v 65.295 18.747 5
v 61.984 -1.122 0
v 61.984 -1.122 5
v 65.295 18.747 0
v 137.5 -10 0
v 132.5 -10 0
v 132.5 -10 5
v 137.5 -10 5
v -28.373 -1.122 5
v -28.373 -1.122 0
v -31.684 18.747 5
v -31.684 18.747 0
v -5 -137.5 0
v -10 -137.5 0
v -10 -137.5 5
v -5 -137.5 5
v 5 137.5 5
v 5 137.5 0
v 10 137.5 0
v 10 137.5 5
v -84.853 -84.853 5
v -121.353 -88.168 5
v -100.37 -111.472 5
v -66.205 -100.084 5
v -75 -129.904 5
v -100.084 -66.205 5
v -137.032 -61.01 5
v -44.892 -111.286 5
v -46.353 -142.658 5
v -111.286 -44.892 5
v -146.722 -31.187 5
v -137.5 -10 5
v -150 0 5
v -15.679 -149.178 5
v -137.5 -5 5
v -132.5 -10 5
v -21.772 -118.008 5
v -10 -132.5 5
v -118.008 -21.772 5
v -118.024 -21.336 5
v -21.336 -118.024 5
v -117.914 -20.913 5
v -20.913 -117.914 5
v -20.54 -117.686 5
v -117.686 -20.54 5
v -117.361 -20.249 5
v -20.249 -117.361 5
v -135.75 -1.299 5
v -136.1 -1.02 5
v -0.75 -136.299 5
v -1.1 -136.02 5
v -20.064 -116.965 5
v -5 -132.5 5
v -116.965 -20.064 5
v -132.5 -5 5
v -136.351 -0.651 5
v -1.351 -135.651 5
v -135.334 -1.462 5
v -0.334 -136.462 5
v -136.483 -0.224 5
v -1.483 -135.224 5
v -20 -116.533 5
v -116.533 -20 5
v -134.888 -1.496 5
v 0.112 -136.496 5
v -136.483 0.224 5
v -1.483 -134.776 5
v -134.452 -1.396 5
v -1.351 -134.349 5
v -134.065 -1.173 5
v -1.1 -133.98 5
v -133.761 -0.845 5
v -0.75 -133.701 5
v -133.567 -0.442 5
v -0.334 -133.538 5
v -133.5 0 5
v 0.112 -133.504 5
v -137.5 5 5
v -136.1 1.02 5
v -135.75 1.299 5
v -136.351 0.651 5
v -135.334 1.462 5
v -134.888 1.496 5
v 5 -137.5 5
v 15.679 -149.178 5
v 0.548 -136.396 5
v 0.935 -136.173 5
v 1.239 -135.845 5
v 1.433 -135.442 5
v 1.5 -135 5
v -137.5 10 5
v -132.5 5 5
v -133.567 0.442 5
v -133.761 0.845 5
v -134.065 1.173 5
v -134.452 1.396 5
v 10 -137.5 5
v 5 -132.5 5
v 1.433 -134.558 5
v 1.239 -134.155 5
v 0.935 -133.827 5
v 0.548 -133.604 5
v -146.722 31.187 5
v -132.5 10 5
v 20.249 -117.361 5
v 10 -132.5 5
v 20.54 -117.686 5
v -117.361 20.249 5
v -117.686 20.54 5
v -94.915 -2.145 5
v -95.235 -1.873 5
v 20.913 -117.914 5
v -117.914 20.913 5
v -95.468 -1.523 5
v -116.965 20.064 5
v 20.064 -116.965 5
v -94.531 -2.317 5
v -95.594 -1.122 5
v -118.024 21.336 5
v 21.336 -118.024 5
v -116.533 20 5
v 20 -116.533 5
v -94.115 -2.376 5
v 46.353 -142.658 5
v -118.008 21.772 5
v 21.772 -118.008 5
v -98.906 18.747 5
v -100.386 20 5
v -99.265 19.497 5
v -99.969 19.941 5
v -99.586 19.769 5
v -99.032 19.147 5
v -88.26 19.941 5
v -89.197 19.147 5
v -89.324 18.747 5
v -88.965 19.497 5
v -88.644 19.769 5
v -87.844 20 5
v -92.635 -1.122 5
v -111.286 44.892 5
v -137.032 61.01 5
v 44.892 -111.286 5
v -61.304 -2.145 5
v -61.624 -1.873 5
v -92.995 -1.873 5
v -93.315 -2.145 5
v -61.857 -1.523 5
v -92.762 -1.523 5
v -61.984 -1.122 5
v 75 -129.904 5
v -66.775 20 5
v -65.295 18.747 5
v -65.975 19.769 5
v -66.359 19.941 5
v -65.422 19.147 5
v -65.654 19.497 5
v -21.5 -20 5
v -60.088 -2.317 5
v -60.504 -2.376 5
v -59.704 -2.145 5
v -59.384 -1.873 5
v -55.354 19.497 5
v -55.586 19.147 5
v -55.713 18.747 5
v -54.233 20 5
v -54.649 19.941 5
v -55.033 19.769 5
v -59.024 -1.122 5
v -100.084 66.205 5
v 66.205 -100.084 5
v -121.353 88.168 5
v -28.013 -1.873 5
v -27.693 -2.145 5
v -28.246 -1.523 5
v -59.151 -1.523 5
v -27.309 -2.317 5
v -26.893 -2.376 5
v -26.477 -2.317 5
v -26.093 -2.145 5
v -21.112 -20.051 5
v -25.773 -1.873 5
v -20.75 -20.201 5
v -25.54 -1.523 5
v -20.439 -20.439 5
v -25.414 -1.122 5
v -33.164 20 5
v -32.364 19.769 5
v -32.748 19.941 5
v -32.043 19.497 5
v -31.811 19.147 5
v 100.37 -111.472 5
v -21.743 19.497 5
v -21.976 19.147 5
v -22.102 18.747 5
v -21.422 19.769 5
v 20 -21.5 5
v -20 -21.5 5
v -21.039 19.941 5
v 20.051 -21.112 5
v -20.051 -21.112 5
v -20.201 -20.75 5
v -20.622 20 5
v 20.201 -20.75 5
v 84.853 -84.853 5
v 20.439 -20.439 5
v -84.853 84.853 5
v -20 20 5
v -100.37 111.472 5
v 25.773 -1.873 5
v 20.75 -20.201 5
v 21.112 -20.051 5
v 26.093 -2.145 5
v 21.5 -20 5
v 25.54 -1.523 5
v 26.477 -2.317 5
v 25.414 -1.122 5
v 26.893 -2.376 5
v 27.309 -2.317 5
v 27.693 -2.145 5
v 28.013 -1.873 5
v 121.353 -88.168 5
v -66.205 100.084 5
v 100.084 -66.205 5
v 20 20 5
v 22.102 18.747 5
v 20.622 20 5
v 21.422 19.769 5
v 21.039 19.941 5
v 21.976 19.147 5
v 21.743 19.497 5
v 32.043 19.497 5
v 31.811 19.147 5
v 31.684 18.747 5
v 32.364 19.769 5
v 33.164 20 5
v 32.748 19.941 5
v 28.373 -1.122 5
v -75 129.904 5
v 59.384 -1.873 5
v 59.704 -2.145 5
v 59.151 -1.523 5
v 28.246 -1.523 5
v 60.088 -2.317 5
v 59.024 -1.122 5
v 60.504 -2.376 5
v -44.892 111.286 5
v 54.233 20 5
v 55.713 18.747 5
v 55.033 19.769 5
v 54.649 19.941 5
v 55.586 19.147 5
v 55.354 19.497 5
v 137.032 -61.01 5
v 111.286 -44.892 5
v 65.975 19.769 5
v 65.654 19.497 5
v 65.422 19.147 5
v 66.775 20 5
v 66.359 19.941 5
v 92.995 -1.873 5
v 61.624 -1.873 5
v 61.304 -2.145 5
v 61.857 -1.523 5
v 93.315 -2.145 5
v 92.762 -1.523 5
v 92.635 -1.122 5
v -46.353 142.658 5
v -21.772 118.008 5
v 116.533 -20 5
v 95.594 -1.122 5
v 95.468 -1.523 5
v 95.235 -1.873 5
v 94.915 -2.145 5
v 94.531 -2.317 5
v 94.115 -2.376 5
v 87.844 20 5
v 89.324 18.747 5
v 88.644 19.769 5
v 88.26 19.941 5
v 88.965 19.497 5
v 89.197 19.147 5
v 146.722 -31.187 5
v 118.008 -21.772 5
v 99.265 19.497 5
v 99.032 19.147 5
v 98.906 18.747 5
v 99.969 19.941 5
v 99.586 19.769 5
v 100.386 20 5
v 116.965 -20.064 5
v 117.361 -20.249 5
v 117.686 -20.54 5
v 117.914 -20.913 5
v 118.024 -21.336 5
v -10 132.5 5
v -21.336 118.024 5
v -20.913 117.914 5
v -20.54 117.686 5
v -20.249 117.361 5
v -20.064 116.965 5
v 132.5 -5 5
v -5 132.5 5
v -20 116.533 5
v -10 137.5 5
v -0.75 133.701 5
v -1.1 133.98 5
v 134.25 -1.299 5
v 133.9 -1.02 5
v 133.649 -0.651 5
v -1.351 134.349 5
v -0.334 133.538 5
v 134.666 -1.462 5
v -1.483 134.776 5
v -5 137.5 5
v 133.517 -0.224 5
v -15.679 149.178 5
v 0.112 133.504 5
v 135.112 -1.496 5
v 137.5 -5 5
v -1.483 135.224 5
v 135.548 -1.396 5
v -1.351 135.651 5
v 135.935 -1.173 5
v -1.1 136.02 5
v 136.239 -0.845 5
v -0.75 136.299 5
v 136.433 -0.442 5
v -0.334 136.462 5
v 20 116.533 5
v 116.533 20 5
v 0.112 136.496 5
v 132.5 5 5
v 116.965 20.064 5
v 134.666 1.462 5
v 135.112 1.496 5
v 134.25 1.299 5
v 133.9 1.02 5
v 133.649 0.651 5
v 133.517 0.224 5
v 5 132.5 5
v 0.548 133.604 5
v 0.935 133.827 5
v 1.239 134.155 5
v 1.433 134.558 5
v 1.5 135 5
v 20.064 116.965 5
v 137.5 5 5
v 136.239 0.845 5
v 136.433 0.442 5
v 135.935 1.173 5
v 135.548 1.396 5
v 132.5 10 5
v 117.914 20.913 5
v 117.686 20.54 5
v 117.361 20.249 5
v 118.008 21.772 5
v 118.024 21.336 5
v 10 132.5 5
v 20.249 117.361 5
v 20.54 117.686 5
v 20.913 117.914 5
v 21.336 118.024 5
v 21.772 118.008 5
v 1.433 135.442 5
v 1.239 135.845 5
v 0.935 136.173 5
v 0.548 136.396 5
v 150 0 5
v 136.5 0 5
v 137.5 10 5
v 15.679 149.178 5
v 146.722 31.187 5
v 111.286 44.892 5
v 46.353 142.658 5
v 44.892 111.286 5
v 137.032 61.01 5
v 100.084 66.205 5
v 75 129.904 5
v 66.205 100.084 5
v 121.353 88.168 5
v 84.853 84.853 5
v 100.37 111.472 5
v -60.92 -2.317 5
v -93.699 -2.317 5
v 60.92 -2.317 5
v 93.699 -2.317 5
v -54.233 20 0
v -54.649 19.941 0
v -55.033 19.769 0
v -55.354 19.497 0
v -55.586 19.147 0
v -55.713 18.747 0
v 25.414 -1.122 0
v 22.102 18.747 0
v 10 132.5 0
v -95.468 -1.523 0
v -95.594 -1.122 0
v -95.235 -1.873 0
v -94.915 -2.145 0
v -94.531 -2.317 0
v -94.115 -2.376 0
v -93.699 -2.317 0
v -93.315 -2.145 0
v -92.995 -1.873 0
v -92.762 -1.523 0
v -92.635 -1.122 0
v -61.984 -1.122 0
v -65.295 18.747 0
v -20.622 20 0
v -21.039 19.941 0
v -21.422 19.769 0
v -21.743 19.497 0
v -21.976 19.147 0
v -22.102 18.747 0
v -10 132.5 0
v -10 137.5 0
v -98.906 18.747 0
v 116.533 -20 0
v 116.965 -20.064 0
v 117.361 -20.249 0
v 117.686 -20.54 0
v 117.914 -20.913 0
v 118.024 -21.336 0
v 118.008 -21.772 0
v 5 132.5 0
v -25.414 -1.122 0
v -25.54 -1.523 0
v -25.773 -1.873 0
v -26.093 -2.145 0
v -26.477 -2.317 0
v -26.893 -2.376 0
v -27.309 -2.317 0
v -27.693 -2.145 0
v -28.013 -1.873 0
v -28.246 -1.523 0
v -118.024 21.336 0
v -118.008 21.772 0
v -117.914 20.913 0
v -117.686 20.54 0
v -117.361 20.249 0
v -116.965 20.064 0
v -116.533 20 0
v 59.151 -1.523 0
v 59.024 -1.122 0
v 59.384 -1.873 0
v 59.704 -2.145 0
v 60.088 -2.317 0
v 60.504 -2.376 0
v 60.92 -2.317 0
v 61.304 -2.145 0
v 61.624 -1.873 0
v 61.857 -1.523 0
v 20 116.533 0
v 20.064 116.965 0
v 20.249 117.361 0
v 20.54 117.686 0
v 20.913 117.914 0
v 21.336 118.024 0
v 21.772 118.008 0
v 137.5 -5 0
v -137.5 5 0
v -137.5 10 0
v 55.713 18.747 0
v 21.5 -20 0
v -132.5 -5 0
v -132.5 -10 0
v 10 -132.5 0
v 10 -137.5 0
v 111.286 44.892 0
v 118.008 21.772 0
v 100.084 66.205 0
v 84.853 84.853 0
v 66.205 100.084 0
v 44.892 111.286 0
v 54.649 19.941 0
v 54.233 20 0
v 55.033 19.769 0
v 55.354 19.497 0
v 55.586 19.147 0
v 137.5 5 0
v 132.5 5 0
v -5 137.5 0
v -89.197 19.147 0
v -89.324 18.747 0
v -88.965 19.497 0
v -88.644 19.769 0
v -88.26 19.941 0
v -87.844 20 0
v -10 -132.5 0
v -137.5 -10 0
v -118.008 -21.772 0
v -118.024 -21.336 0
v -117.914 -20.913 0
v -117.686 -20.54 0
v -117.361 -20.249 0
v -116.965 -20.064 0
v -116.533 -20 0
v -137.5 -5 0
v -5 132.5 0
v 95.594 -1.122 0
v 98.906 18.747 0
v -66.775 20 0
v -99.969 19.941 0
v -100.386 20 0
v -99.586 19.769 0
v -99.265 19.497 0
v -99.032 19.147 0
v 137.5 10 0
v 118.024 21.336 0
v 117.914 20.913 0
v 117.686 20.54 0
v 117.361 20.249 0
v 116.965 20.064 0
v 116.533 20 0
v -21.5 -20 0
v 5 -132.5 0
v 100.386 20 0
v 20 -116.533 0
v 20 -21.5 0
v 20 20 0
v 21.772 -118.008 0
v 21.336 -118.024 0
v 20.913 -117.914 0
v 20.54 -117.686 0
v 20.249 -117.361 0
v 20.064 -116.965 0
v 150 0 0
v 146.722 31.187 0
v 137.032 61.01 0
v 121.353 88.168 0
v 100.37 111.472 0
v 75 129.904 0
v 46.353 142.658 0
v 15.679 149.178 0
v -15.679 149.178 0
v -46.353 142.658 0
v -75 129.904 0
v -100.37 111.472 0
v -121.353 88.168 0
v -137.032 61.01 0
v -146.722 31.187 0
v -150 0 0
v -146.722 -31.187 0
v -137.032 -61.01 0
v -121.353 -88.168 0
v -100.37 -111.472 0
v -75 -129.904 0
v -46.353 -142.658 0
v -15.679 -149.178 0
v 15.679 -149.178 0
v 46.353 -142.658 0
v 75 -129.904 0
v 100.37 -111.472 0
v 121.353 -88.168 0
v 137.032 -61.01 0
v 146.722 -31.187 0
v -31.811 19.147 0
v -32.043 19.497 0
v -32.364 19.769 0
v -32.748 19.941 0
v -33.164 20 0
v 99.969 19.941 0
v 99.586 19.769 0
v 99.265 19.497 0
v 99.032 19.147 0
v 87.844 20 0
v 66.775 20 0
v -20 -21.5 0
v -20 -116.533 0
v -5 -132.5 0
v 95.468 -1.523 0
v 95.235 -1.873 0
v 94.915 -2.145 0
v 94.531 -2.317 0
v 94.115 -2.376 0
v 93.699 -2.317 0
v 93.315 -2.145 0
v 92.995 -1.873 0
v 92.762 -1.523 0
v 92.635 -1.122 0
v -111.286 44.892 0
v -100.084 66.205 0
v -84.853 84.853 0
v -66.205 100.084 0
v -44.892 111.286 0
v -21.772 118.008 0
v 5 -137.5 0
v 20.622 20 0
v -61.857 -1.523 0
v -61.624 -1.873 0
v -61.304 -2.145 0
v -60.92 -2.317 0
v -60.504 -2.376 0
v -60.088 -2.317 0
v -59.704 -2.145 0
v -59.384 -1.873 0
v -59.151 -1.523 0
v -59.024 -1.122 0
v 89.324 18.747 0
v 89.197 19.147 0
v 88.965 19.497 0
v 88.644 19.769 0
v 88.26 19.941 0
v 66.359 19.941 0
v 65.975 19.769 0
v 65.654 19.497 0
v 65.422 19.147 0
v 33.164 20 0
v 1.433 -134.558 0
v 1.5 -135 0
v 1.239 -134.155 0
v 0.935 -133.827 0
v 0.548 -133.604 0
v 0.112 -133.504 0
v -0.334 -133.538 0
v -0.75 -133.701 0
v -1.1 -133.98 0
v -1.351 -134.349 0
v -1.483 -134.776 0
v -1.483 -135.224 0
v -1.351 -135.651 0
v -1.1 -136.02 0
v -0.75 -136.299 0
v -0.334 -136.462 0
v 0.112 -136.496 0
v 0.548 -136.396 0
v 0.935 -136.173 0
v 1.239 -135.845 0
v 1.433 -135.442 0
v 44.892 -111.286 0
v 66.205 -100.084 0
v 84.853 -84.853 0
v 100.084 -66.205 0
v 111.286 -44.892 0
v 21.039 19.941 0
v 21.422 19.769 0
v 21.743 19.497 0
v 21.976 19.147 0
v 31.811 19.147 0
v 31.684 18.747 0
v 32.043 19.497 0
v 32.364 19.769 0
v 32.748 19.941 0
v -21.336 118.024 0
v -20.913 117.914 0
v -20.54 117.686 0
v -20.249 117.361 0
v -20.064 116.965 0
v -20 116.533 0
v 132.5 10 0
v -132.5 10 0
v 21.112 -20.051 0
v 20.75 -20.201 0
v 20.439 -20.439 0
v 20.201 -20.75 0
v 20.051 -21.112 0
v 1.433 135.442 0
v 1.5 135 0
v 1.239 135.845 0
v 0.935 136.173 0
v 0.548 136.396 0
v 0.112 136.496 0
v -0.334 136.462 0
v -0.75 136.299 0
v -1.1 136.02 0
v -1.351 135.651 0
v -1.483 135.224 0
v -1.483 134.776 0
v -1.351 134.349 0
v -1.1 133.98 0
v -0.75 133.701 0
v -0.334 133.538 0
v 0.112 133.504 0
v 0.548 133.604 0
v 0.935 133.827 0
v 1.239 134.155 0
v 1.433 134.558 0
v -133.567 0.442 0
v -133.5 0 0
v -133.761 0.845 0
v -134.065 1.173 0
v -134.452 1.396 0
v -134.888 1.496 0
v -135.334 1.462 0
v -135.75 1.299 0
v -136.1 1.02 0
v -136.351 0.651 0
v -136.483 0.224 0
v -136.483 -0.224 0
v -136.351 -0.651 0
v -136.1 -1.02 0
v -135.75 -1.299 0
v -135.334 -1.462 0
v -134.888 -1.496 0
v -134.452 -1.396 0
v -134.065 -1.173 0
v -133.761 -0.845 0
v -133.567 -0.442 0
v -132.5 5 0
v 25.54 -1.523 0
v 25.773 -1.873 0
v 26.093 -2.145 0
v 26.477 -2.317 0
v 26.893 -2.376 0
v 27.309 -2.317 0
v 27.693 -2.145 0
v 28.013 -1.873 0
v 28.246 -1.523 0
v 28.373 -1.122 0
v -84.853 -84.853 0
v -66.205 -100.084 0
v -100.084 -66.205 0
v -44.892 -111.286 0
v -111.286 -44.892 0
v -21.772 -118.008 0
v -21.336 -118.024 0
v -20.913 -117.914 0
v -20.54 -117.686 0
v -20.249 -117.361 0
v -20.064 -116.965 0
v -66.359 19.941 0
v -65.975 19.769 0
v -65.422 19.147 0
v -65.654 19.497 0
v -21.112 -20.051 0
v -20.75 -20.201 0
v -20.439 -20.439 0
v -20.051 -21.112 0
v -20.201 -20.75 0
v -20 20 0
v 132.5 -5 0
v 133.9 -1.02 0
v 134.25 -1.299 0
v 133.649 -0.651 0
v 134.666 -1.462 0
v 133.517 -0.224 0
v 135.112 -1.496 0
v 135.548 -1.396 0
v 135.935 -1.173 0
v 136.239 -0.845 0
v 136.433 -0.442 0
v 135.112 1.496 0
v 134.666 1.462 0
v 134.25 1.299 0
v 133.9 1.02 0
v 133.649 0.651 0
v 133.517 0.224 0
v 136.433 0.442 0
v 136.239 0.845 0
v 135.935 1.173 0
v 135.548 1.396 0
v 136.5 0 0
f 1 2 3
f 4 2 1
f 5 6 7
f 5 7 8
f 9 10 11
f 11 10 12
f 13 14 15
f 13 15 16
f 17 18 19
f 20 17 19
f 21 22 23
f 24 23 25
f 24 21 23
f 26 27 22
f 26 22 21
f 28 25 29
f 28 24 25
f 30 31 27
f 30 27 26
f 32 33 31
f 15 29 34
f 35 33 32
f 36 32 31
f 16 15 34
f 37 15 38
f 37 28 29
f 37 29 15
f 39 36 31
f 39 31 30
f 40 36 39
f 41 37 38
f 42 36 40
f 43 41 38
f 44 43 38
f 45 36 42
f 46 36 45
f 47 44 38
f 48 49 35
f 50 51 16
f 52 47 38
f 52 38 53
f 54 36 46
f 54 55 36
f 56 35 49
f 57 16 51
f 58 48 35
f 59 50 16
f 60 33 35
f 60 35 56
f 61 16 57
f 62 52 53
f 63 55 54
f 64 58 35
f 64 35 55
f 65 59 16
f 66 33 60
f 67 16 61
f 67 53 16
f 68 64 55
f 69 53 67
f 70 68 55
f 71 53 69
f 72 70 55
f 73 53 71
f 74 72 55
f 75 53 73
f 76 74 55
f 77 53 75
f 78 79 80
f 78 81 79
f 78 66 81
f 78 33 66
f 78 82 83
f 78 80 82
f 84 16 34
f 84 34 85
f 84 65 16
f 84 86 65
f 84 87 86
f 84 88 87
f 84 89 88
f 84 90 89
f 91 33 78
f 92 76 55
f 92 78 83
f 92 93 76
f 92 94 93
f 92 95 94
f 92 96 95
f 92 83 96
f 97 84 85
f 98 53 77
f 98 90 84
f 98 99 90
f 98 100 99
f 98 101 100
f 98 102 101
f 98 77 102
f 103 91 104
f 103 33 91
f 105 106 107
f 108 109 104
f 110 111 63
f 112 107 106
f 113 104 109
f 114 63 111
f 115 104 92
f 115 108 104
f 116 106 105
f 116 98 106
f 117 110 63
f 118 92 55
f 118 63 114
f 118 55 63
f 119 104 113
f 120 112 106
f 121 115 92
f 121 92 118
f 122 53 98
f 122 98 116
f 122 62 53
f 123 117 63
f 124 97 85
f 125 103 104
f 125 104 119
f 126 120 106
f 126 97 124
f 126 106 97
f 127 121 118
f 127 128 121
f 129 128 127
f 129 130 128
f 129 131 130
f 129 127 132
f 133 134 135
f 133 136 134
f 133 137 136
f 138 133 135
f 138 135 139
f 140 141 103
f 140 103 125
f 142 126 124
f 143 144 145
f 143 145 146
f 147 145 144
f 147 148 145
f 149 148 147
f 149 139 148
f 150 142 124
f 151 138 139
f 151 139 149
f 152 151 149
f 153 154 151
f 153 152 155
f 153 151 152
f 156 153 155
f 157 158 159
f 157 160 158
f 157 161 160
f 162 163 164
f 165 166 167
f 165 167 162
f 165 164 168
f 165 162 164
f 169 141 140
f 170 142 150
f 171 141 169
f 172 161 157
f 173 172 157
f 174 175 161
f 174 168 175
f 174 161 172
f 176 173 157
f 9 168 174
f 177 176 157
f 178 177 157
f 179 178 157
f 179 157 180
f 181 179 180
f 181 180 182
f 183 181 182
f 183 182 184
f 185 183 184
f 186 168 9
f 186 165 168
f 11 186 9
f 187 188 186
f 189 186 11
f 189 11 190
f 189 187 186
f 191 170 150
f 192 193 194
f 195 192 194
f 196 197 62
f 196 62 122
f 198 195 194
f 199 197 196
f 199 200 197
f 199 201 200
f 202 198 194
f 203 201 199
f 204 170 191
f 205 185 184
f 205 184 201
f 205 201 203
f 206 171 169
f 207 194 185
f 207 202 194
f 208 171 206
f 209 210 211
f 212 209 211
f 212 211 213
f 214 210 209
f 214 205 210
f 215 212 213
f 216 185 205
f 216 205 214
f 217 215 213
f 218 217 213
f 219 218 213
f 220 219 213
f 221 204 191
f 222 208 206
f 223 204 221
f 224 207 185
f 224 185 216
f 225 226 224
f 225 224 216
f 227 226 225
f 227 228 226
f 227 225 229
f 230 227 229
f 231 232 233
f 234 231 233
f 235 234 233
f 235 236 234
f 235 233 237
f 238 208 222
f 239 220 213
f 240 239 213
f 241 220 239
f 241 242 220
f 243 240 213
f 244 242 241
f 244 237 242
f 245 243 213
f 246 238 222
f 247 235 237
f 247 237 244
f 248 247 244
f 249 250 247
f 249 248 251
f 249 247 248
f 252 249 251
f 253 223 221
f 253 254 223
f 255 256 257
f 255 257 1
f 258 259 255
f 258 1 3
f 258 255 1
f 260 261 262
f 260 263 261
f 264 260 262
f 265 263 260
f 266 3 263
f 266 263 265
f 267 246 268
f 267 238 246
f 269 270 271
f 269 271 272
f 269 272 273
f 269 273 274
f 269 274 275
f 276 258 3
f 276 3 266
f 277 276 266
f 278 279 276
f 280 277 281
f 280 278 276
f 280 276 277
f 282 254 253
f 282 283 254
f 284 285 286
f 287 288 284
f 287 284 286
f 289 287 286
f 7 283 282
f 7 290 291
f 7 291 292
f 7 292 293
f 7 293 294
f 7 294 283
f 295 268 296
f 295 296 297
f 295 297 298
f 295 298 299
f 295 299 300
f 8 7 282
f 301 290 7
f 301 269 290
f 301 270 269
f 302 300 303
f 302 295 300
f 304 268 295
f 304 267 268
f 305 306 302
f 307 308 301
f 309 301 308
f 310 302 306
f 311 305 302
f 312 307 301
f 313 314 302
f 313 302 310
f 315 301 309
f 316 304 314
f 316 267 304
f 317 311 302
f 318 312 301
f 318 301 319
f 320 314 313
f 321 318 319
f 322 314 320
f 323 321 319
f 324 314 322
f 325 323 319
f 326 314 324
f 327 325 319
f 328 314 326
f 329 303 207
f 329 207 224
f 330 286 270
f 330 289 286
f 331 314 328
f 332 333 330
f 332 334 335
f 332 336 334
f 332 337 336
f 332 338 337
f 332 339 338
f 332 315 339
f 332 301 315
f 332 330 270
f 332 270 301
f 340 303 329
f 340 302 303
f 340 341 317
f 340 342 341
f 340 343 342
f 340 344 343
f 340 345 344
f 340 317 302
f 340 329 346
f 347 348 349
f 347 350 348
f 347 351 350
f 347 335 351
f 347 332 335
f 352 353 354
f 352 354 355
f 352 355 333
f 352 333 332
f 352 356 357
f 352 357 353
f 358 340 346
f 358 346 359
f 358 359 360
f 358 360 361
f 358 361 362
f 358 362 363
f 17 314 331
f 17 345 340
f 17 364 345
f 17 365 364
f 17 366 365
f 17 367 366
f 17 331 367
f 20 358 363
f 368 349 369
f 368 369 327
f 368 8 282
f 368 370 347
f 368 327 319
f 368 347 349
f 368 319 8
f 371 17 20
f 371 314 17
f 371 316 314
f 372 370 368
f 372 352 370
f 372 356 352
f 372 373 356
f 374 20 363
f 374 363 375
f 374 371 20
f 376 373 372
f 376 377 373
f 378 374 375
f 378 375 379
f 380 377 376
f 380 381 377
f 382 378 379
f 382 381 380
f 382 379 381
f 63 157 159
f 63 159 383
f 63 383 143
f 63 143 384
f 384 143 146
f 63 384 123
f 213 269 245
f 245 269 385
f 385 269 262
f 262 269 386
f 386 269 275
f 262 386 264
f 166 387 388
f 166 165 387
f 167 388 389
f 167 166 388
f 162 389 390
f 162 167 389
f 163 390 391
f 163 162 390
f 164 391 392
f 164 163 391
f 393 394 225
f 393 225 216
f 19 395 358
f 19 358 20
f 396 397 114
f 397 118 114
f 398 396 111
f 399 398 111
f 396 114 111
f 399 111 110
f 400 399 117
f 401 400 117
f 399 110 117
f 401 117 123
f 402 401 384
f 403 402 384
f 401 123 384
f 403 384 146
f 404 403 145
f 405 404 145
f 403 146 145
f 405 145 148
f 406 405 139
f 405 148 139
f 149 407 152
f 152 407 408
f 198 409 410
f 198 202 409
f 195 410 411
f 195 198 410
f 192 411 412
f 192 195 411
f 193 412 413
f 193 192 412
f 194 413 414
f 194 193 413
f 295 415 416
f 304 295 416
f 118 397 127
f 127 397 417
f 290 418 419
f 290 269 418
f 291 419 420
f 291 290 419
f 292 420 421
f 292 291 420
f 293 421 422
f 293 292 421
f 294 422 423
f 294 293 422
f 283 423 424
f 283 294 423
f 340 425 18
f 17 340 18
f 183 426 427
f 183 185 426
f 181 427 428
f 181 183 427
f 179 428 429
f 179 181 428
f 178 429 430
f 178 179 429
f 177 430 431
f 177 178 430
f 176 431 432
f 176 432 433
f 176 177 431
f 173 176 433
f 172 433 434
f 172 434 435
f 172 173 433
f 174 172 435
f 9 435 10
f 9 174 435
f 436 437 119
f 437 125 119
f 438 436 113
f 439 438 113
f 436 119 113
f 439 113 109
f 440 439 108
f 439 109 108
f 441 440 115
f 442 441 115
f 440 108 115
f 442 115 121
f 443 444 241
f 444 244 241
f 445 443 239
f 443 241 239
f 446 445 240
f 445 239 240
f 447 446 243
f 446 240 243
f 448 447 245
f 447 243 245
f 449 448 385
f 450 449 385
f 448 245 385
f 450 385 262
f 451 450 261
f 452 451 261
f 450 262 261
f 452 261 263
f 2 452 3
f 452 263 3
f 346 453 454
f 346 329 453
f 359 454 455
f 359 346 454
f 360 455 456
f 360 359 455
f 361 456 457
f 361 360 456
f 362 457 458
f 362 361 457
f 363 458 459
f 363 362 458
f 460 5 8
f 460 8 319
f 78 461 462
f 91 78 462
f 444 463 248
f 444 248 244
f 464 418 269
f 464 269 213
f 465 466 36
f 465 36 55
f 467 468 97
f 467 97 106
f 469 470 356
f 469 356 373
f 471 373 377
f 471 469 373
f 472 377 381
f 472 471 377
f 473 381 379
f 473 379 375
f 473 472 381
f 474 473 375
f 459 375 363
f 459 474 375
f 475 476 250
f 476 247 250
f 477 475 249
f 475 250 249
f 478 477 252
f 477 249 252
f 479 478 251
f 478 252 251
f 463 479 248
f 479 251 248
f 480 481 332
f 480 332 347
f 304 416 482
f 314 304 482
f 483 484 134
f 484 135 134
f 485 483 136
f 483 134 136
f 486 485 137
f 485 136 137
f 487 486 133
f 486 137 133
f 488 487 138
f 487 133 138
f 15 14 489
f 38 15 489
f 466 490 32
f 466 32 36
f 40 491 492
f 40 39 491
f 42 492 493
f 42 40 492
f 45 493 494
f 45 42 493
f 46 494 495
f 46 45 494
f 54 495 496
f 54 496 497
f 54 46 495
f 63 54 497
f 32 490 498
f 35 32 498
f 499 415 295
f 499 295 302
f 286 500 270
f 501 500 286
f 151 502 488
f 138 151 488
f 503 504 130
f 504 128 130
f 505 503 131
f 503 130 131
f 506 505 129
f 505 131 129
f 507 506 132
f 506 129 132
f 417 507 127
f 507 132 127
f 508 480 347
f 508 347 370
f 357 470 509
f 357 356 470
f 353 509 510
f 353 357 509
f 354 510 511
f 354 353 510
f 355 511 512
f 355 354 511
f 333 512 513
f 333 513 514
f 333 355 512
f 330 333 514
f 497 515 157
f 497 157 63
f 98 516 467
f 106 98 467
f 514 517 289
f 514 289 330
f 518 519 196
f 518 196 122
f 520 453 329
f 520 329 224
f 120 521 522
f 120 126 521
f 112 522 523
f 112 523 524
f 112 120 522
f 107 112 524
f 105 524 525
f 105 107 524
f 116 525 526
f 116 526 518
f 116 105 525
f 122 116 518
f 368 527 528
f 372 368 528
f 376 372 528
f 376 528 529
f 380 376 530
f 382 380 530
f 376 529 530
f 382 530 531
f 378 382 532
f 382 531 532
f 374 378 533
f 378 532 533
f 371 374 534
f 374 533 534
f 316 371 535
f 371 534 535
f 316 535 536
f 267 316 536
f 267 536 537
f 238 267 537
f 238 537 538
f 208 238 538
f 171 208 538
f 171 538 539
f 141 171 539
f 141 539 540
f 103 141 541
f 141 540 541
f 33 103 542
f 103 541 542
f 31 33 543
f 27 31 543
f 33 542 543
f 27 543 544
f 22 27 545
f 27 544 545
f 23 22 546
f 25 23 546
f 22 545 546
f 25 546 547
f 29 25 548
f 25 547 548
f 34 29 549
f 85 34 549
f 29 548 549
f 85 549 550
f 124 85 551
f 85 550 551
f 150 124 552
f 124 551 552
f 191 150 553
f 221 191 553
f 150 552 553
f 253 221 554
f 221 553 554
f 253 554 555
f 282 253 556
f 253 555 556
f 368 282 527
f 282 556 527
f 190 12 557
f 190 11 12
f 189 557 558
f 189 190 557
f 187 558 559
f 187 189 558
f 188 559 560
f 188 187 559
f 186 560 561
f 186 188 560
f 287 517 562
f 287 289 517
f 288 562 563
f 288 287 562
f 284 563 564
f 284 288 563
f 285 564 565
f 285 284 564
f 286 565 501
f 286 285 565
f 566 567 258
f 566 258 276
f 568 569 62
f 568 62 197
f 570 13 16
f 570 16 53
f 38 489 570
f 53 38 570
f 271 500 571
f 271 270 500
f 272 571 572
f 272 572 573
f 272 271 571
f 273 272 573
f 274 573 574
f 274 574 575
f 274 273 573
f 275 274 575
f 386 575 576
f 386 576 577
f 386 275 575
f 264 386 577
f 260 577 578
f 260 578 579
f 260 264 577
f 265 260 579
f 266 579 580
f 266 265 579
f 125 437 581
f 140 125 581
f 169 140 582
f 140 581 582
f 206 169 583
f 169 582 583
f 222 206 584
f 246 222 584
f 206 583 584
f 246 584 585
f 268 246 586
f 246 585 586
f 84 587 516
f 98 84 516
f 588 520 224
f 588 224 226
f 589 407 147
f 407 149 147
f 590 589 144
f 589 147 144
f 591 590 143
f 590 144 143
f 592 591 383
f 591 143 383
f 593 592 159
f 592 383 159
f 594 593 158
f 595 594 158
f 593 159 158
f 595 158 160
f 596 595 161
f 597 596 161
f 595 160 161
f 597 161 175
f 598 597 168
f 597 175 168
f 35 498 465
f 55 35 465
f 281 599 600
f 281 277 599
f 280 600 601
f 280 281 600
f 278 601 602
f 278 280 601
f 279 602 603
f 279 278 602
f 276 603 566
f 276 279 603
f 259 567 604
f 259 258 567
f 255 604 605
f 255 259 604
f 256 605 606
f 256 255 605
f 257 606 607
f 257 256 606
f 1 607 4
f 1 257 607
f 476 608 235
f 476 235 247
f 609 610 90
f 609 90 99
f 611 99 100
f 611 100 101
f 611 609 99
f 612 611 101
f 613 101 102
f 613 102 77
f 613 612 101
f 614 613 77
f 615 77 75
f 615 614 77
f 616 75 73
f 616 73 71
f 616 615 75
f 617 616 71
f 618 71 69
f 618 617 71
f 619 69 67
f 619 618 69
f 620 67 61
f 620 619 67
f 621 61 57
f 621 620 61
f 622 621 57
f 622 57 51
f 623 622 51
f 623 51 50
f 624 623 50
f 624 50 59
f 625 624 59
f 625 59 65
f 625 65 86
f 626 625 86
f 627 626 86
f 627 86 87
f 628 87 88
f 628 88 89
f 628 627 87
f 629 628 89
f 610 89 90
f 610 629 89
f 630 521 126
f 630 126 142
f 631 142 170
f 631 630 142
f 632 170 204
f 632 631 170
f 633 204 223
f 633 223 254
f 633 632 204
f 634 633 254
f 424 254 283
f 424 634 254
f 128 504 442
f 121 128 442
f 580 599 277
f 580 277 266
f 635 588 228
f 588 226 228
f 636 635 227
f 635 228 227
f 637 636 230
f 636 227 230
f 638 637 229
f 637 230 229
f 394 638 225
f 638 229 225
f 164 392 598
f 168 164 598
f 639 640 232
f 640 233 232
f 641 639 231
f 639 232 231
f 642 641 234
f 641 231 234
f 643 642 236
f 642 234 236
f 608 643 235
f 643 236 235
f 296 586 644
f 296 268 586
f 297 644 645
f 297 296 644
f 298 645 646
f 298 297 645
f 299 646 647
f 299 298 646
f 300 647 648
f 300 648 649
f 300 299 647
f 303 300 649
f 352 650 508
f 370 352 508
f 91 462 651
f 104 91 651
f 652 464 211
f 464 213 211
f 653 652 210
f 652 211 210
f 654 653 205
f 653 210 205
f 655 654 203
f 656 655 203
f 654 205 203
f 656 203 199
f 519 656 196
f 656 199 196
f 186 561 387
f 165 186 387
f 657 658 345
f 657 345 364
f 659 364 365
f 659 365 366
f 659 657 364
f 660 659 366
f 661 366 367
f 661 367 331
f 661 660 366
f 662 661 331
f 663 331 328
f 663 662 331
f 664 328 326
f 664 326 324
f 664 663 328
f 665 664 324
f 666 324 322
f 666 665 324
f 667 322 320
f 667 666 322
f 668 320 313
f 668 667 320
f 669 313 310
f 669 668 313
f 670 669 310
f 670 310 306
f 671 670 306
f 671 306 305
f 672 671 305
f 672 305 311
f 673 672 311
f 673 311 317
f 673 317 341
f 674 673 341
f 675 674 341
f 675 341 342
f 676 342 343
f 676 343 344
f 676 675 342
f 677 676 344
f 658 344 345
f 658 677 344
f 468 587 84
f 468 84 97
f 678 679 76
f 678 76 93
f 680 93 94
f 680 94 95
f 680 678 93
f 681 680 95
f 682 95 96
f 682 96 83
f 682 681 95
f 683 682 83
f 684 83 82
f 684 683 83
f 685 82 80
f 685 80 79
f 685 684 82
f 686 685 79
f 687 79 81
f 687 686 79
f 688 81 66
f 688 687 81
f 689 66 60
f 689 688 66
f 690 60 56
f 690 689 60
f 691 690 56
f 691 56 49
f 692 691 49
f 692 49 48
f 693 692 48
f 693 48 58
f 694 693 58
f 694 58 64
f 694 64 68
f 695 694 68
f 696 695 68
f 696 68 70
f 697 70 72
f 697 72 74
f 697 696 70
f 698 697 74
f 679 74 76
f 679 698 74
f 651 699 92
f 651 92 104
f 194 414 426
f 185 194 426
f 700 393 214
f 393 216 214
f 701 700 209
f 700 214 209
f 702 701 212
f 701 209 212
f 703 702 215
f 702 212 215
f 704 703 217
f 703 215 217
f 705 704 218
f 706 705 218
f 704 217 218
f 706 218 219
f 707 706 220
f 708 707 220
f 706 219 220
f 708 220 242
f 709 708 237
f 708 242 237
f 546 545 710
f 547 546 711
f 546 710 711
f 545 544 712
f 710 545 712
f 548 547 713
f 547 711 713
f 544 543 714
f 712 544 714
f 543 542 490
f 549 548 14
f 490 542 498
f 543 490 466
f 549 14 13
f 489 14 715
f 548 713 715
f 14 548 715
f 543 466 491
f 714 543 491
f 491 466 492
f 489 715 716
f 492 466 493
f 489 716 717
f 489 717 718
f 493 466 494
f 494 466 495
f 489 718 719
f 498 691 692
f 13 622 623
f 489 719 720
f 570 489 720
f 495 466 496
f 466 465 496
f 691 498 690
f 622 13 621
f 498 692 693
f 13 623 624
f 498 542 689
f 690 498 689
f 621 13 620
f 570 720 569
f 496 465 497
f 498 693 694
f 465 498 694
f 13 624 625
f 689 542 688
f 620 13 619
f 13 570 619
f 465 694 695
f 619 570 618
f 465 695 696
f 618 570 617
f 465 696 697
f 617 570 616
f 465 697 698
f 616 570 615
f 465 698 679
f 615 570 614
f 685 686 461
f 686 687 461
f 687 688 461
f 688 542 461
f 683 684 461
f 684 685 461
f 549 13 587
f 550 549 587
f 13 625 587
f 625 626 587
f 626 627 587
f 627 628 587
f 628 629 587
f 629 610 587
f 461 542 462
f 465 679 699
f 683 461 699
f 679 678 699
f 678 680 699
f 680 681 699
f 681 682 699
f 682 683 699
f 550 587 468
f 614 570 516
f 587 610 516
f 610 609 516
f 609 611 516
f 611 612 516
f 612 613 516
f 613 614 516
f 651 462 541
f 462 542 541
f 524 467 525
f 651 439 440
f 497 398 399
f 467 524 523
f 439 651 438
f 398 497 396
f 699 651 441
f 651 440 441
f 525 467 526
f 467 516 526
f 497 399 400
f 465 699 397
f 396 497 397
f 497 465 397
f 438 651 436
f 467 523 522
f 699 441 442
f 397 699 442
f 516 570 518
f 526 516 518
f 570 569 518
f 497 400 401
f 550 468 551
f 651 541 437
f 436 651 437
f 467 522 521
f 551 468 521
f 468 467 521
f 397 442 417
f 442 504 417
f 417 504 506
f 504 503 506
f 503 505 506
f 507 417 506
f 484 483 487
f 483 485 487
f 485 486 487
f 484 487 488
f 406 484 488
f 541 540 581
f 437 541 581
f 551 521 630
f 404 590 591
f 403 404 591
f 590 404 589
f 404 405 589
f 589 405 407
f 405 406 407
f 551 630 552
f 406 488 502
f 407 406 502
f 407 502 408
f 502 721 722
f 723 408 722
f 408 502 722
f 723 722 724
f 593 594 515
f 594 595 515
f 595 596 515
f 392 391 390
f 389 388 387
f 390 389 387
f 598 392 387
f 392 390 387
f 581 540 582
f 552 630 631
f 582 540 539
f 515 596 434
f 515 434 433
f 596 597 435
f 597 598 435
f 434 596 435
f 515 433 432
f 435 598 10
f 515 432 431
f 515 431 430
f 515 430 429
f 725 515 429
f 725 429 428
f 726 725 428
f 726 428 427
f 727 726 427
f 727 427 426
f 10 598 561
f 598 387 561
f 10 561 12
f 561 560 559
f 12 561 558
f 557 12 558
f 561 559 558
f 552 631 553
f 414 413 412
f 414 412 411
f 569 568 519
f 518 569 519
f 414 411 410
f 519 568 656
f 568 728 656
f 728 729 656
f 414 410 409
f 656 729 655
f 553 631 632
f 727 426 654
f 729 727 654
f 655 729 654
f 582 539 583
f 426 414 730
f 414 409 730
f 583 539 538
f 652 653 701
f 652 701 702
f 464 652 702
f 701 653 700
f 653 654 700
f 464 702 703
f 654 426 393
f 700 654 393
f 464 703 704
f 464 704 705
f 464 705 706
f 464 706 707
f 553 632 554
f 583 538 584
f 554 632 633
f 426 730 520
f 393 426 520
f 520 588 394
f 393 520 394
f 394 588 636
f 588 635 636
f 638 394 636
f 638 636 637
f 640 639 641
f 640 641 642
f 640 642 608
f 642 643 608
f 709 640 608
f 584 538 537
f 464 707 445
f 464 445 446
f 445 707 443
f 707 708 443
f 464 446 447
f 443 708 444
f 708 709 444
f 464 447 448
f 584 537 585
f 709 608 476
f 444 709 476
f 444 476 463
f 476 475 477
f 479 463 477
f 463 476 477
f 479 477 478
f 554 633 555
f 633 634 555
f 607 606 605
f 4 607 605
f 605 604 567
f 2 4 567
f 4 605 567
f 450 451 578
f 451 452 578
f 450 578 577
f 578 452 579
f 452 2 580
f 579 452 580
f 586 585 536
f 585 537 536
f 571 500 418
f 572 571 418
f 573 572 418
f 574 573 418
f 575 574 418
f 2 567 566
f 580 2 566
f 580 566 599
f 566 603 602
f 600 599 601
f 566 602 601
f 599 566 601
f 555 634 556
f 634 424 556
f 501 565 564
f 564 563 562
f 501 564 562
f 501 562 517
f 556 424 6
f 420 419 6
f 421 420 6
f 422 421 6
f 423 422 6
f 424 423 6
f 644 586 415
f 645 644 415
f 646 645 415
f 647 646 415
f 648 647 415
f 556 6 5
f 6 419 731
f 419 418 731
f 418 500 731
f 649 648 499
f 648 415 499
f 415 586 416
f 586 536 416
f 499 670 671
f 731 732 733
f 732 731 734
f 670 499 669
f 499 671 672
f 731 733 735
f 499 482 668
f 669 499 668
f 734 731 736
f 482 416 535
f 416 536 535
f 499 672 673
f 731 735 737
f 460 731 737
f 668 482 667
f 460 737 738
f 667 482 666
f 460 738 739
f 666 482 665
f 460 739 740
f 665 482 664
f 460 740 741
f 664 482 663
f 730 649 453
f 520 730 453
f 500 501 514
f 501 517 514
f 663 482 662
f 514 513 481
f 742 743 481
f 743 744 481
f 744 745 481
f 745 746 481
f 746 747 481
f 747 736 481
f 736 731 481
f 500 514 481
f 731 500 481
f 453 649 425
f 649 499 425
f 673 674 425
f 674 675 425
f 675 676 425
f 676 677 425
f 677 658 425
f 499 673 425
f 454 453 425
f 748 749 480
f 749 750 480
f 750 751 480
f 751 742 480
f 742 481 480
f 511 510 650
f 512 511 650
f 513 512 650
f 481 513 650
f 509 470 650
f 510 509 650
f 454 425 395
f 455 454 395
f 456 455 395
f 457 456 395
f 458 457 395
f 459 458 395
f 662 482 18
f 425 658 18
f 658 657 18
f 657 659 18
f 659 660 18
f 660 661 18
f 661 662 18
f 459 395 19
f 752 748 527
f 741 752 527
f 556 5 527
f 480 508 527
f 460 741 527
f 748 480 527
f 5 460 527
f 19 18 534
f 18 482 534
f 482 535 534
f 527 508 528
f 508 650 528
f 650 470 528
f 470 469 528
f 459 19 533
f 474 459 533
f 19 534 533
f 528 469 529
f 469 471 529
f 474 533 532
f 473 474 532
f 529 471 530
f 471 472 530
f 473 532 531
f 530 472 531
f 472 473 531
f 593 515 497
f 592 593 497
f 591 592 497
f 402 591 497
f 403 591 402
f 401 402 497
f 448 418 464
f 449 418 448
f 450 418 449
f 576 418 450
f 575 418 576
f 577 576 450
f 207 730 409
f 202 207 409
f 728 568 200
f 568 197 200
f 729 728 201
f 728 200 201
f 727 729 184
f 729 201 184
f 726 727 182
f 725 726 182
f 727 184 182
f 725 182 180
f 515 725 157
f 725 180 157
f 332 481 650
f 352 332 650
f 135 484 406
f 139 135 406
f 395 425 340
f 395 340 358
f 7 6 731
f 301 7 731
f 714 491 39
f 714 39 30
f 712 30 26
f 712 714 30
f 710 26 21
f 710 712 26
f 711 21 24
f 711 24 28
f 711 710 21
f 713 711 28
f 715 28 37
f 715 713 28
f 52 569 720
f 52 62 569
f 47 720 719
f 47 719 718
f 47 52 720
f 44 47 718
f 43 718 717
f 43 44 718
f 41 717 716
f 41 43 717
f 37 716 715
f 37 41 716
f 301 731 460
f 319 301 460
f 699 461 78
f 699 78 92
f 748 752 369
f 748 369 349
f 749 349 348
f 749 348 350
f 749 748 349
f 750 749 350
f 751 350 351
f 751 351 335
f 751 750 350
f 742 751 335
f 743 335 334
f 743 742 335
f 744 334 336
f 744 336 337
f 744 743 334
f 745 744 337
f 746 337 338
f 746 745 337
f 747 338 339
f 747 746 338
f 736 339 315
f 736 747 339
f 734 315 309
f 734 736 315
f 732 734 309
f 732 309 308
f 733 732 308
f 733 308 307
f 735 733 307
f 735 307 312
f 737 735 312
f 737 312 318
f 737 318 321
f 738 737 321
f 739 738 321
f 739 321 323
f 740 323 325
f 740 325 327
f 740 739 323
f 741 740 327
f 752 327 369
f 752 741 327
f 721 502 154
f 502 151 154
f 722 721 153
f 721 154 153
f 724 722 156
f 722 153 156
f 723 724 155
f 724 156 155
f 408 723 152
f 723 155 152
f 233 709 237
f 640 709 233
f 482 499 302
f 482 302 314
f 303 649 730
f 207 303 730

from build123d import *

# Parameters (mm, degrees)
ESQUISSE1_R        = 150
ESQUISSE1_R_2      = 1.5
ESQUISSE1_W        = 5
ESQUISSE1_H        = 5
BOSS_EXTRU_1_DEPTH = 5
CONG_1_R           = 1.5


with BuildPart() as part:
    # Esquisse1 → Boss.-Extru.1 (new body)
    with BuildSketch(Plane.XY):
        Circle(ESQUISSE1_R)
        with Locations((-135, 0)):
            Circle(ESQUISSE1_R_2, mode=Mode.SUBTRACT)
        with Locations((0, 135)):
            Circle(ESQUISSE1_R_2, mode=Mode.SUBTRACT)
        with Locations((135, 0)):
            Circle(ESQUISSE1_R_2, mode=Mode.SUBTRACT)
        with Locations((0, -135)):
            Circle(ESQUISSE1_R_2, mode=Mode.SUBTRACT)
        with BuildLine():
            Line((-20, 118.321595662), (-20, 20))
            Line((-20, 20), (-21.893135369, 20))
            Line((-21.893135369, 20), (-26.893135369, -10))
            Line((-26.893135369, -10), (-31.893135369, 20))
            Line((-31.893135369, 20), (-55.504004396, 20))
            Line((-55.504004396, 20), (-60.504004396, -10))
            Line((-60.504004396, -10), (-65.504004396, 20))
            Line((-65.504004396, 20), (-89.114873423, 20))
            Line((-89.114873423, 20), (-94.114873423, -10))
            Line((-94.114873423, -10), (-99.114873423, 20))
            Line((-99.114873423, 20), (-118.321595662, 20))
            ThreePointArc((-118.321595662, 20), (-84.852813742, 84.852813742), (-20, 118.321595662))
        make_face(mode=Mode.SUBTRACT)
        with BuildLine():
            Line((20, 118.321595662), (20, 20))
            Line((20, 20), (21.893135369, 20))
            Line((21.893135369, 20), (26.893135369, -10))
            Line((26.893135369, -10), (31.893135369, 20))
            Line((31.893135369, 20), (55.504004396, 20))
            Line((55.504004396, 20), (60.504004396, -10))
            Line((60.504004396, -10), (65.504004396, 20))
            Line((65.504004396, 20), (89.114873423, 20))
            Line((89.114873423, 20), (94.114873423, -10))
            Line((94.114873423, -10), (99.114873423, 20))
            Line((99.114873423, 20), (118.321595662, 20))
            ThreePointArc((118.321595662, 20), (84.852813742, 84.852813742), (20, 118.321595662))
        make_face(mode=Mode.SUBTRACT)
        with BuildLine():
            Line((118.321595662, -20), (20, -20))
            Line((20, -20), (20, -118.321595662))
            ThreePointArc((20, -118.321595662), (84.852813742, -84.852813742), (118.321595662, -20))
        make_face(mode=Mode.SUBTRACT)
        with BuildLine():
            Line((-20, -118.321595662), (-20, -20))
            Line((-20, -20), (-118.321595662, -20))
            ThreePointArc((-118.321595662, -20), (-84.852813742, -84.852813742), (-20, -118.321595662))
        make_face(mode=Mode.SUBTRACT)
        with Locations((-135, -7.5)):
            Rectangle(ESQUISSE1_W, ESQUISSE1_H, mode=Mode.SUBTRACT)
        with Locations((-135, 7.5)):
            Rectangle(ESQUISSE1_W, ESQUISSE1_H, mode=Mode.SUBTRACT)
        with Locations((-7.5, 135)):
            Rectangle(ESQUISSE1_W, ESQUISSE1_H, mode=Mode.SUBTRACT)
        with Locations((7.5, 135)):
            Rectangle(ESQUISSE1_W, ESQUISSE1_H, mode=Mode.SUBTRACT)
        with Locations((135, 7.5)):
            Rectangle(ESQUISSE1_W, ESQUISSE1_H, mode=Mode.SUBTRACT)
        with Locations((135, -7.5)):
            Rectangle(ESQUISSE1_W, ESQUISSE1_H, mode=Mode.SUBTRACT)
        with Locations((7.5, -135)):
            Rectangle(ESQUISSE1_W, ESQUISSE1_H, mode=Mode.SUBTRACT)
        with Locations((-7.5, -135)):
            Rectangle(ESQUISSE1_W, ESQUISSE1_H, mode=Mode.SUBTRACT)
    extrude(amount=BOSS_EXTRU_1_DEPTH)

    # Congé1
    cong_1_edges = [part.edges().sort_by_distance(p)[0] for p in [
        (-20, -20, 2.5),
        (-118.321595662, -20, 2.5),
        (-20, -118.321595662, 2.5),
        (20, -20, 2.5),
        (20, -118.321595662, 2.5),
        (118.321595662, -20, 2.5),
        (21.893135369, 20, 2.5),
        (26.893135369, -10, 2.5),
        (31.893135369, 20, 2.5),
        (55.504004396, 20, 2.5),
        (60.504004396, -10, 2.5),
        (65.504004396, 20, 2.5),
        (89.114873423, 20, 2.5),
        (94.114873423, -10, 2.5),
        (99.114873423, 20, 2.5),
        (118.321595662, 20, 2.5),
        (20, 118.321595662, 2.5),
        (-99.114873423, 20, 2.5),
        (-94.114873423, -10, 2.5),
        (-89.114873423, 20, 2.5),
        (-65.504004396, 20, 2.5),
        (-60.504004396, -10, 2.5),
        (-55.504004396, 20, 2.5),
        (-31.893135369, 20, 2.5),
        (-26.893135369, -10, 2.5),
        (-21.893135369, 20, 2.5),
        (-20, 118.321595662, 2.5),
        (-118.321595662, 20, 2.5),
    ]]
    fillet(cong_1_edges, radius=CONG_1_R)


solid = part.part
